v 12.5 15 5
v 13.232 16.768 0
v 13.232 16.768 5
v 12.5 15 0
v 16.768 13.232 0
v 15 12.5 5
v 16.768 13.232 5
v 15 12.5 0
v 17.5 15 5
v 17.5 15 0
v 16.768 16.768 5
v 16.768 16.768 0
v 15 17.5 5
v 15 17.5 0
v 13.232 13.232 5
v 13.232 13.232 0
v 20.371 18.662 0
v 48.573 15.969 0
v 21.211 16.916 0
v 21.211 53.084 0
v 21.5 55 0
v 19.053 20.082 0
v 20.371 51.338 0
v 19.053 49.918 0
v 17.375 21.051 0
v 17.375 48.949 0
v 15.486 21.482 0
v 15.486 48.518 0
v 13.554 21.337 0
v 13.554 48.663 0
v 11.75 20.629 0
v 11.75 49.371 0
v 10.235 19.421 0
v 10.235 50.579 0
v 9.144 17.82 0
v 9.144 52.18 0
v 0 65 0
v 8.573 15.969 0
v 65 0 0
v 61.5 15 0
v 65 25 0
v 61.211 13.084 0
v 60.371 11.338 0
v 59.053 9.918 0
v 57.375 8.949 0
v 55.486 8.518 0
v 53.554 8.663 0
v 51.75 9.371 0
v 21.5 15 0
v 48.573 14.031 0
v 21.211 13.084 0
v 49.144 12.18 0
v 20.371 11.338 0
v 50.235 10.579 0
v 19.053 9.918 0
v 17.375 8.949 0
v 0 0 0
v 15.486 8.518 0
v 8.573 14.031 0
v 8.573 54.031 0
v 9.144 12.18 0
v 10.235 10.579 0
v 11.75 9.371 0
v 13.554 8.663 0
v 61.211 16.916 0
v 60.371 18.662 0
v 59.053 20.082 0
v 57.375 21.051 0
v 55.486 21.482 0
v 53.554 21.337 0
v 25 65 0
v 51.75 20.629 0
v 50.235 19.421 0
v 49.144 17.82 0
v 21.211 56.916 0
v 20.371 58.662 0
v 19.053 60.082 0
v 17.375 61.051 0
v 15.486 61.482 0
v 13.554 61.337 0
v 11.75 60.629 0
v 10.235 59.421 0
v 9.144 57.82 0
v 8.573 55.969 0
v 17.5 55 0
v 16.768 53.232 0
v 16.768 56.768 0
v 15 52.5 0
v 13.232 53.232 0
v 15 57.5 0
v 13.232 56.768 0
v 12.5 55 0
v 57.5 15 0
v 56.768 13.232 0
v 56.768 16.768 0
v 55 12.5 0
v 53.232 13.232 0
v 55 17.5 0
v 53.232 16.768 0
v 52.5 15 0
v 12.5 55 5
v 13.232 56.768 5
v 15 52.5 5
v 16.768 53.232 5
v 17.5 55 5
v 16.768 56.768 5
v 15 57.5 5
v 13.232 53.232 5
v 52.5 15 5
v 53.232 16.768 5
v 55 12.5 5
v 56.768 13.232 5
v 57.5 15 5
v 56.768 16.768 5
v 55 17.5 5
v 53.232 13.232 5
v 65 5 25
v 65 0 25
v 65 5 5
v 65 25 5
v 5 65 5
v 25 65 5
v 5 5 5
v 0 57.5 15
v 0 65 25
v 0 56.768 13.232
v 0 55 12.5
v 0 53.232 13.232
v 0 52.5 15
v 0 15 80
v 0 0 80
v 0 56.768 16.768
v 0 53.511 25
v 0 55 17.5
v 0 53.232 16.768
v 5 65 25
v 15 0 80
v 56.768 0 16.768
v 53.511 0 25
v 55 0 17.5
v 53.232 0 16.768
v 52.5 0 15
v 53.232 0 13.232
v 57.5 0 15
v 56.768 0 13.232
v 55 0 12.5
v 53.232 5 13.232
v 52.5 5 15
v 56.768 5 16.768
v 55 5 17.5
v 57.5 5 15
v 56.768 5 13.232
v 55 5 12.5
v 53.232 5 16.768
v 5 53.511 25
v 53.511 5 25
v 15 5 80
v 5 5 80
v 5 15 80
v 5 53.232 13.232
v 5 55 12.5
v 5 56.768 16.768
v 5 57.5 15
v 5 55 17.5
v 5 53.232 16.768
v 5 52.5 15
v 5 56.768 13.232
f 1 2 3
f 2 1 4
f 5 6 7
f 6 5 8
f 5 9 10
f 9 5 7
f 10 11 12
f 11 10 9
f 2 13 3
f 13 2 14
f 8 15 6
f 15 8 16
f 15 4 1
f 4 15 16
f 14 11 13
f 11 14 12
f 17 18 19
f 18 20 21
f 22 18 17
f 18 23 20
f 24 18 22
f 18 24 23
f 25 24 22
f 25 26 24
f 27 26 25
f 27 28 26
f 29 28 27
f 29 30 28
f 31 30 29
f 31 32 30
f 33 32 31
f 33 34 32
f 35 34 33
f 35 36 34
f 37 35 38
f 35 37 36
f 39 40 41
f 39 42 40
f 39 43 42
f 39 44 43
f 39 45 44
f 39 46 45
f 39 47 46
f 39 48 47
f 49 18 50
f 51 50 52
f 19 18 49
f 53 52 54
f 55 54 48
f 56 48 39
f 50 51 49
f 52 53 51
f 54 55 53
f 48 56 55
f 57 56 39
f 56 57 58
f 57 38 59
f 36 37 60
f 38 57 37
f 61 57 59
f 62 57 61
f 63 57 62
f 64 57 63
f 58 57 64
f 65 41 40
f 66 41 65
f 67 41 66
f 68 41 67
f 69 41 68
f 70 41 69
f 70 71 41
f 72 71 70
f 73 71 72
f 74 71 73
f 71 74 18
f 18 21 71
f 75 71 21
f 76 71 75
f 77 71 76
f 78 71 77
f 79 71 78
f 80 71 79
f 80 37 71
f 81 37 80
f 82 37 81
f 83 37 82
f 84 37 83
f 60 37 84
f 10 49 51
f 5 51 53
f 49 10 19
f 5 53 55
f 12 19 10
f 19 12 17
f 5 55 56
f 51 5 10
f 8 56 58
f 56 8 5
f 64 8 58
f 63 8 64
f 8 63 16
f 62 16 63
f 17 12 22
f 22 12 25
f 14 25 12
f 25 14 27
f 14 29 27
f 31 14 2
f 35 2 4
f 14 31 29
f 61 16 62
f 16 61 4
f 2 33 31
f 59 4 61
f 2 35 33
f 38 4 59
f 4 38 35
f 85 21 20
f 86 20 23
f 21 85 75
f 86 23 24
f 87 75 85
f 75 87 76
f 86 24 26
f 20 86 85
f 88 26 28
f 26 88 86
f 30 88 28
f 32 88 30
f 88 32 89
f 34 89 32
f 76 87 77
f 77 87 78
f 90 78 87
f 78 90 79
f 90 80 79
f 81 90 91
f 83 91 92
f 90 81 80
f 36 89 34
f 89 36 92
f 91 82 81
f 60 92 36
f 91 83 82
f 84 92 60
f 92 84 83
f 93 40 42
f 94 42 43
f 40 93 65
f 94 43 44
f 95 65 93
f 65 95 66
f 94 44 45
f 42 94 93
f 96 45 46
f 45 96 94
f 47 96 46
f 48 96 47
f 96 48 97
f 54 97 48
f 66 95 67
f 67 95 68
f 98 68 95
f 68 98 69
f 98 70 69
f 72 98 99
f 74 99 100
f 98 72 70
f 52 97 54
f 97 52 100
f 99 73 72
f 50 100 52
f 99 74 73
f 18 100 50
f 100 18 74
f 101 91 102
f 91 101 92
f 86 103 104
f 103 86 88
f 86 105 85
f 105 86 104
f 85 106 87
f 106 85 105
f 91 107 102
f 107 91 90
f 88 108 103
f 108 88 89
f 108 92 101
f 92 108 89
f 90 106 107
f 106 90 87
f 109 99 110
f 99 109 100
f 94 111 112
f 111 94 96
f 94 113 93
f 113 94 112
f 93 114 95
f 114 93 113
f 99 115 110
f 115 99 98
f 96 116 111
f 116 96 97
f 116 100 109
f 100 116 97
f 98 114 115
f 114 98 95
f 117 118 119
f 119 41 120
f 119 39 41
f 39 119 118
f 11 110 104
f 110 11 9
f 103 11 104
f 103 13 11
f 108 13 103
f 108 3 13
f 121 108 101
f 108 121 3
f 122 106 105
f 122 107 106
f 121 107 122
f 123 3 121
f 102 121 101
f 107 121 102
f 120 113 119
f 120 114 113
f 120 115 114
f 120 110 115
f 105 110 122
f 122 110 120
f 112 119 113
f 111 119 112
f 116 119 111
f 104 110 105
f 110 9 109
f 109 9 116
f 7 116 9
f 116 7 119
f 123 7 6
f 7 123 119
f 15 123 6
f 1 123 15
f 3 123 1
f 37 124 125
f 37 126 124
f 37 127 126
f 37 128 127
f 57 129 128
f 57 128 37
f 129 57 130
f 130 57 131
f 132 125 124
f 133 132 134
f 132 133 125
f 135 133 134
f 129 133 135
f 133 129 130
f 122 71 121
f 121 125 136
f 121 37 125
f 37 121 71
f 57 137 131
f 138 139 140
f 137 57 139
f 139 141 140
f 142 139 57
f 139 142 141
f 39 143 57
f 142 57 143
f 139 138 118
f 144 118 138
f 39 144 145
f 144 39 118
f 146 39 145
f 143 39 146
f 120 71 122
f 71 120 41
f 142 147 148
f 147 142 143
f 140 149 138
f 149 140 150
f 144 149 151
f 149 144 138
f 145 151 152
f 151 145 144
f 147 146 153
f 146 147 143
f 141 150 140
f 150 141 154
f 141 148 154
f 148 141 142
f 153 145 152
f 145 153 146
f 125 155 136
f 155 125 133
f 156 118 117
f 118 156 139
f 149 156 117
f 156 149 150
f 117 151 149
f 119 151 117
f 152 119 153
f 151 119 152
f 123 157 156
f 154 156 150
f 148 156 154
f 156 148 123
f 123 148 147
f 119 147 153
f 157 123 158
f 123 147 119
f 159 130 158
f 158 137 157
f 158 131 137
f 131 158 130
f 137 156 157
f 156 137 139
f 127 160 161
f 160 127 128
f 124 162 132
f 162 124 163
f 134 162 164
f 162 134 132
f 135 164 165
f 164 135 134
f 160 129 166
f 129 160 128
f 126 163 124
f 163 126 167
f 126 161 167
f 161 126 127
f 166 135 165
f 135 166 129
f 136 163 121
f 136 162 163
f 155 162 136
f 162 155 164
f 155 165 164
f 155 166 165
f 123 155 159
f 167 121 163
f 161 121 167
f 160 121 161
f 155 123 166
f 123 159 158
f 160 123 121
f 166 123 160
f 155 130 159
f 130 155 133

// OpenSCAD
// file: configuration.scad
// Copyright (C) 2012 t00tie
// Adapto is licensed under the Creative Commons - GNU GPL license.
// http://creativecommons.org/licenses/GPL/2.0/

// Configuration file for Adapto OpenSCAD files

boltOuterRadius=5/2;// outer radius of bolt threads, 5 for M5 bolts
boltLength=60;//bolt length without head (threaded part only)
washerOuterRadius=13/2;// washers that fit the bolts
washerLength=10;// this is large because it is used to make holes for washers

frameX=20;// width of frame parts (alu, wood etc.)
frameY=20;// ditto

boltOffset=frameX/2;// How far in the bolt holes go, may need tweaking if framX!=frameY
// file: bolt.scad
include <configuration.scad>;

module bolt(){
	union(){
		translate([0, 0, -boltLength]) cylinder(r=boltOuterRadius, h=boltLength+1);
		cylinder(r=washerOuterRadius, h=washerLength);
	}
}

// a bolt and washer intended for making equivalent holes
// the parameter from indicates which side the bolt is inserted from
module boltWasher(from="x-"){
	if(from=="x+"){
		rotate([0, 90, 0]) bolt();
	} else
	if(from=="x-"){
		rotate([0, -90, 0]) bolt();
	} else
	if(from=="y+"){
		rotate([-90, 0, 0]) bolt();
	} else
	if(from=="y-"){
		rotate([90, 0, 0]) bolt();
	} else
	if(from=="z+"){
		rotate([0, 0, 0]) bolt();
	} else
	if(from=="z-"){
		rotate([180, 0, 0]) bolt();
	}
}

boltWasher("x-");
// main file
// Copyright (C) 2012 t00tie
// After an stl designed by RoTorIT
// Adapto is licensed under the Creative Commons - GNU GPL license.
// http://creativecommons.org/licenses/GPL/2.0/

h=80;// height
b=65;// breadth
t=5;// wall thickness

use <bolt.scad>;
include <configuration.scad>;

difference(){
	cube([b, b, t]);
	translate([b, 25, -t]) rotate([0, 0, 45]) cube([2*b, 2*b, 3*t]);
	translate([boltOffset+t, boltOffset+t, 0]) boltWasher("z-");
	translate([boltOffset+t, b-10, 0]) boltWasher("z-");
	translate([b-boltOffset, boltOffset+t, 0]) boltWasher("z-");
}

difference(){
	cube([b, t, 25]);
	translate([b-boltOffset, -t, boltOffset+t]) boltWasher("y-");
}
translate([0, 0, 25]) difference(){
	cube([b-10, t, h-25]);
	translate([15, -t, h-25]) rotate([0, 55, 0]) cube([h, 3*t, h]);
}

difference(){
	cube([t, b, 25]);
	translate([-t, b-boltOffset, boltOffset+t]) boltWasher("x-");
}
translate([0, 0, 25]) difference(){
	cube([t, b-boltOffset, h-25]);
	translate([-t, 15, h-25]) rotate([-55, 0, 0]) cube([3*t, h, h]);

}
